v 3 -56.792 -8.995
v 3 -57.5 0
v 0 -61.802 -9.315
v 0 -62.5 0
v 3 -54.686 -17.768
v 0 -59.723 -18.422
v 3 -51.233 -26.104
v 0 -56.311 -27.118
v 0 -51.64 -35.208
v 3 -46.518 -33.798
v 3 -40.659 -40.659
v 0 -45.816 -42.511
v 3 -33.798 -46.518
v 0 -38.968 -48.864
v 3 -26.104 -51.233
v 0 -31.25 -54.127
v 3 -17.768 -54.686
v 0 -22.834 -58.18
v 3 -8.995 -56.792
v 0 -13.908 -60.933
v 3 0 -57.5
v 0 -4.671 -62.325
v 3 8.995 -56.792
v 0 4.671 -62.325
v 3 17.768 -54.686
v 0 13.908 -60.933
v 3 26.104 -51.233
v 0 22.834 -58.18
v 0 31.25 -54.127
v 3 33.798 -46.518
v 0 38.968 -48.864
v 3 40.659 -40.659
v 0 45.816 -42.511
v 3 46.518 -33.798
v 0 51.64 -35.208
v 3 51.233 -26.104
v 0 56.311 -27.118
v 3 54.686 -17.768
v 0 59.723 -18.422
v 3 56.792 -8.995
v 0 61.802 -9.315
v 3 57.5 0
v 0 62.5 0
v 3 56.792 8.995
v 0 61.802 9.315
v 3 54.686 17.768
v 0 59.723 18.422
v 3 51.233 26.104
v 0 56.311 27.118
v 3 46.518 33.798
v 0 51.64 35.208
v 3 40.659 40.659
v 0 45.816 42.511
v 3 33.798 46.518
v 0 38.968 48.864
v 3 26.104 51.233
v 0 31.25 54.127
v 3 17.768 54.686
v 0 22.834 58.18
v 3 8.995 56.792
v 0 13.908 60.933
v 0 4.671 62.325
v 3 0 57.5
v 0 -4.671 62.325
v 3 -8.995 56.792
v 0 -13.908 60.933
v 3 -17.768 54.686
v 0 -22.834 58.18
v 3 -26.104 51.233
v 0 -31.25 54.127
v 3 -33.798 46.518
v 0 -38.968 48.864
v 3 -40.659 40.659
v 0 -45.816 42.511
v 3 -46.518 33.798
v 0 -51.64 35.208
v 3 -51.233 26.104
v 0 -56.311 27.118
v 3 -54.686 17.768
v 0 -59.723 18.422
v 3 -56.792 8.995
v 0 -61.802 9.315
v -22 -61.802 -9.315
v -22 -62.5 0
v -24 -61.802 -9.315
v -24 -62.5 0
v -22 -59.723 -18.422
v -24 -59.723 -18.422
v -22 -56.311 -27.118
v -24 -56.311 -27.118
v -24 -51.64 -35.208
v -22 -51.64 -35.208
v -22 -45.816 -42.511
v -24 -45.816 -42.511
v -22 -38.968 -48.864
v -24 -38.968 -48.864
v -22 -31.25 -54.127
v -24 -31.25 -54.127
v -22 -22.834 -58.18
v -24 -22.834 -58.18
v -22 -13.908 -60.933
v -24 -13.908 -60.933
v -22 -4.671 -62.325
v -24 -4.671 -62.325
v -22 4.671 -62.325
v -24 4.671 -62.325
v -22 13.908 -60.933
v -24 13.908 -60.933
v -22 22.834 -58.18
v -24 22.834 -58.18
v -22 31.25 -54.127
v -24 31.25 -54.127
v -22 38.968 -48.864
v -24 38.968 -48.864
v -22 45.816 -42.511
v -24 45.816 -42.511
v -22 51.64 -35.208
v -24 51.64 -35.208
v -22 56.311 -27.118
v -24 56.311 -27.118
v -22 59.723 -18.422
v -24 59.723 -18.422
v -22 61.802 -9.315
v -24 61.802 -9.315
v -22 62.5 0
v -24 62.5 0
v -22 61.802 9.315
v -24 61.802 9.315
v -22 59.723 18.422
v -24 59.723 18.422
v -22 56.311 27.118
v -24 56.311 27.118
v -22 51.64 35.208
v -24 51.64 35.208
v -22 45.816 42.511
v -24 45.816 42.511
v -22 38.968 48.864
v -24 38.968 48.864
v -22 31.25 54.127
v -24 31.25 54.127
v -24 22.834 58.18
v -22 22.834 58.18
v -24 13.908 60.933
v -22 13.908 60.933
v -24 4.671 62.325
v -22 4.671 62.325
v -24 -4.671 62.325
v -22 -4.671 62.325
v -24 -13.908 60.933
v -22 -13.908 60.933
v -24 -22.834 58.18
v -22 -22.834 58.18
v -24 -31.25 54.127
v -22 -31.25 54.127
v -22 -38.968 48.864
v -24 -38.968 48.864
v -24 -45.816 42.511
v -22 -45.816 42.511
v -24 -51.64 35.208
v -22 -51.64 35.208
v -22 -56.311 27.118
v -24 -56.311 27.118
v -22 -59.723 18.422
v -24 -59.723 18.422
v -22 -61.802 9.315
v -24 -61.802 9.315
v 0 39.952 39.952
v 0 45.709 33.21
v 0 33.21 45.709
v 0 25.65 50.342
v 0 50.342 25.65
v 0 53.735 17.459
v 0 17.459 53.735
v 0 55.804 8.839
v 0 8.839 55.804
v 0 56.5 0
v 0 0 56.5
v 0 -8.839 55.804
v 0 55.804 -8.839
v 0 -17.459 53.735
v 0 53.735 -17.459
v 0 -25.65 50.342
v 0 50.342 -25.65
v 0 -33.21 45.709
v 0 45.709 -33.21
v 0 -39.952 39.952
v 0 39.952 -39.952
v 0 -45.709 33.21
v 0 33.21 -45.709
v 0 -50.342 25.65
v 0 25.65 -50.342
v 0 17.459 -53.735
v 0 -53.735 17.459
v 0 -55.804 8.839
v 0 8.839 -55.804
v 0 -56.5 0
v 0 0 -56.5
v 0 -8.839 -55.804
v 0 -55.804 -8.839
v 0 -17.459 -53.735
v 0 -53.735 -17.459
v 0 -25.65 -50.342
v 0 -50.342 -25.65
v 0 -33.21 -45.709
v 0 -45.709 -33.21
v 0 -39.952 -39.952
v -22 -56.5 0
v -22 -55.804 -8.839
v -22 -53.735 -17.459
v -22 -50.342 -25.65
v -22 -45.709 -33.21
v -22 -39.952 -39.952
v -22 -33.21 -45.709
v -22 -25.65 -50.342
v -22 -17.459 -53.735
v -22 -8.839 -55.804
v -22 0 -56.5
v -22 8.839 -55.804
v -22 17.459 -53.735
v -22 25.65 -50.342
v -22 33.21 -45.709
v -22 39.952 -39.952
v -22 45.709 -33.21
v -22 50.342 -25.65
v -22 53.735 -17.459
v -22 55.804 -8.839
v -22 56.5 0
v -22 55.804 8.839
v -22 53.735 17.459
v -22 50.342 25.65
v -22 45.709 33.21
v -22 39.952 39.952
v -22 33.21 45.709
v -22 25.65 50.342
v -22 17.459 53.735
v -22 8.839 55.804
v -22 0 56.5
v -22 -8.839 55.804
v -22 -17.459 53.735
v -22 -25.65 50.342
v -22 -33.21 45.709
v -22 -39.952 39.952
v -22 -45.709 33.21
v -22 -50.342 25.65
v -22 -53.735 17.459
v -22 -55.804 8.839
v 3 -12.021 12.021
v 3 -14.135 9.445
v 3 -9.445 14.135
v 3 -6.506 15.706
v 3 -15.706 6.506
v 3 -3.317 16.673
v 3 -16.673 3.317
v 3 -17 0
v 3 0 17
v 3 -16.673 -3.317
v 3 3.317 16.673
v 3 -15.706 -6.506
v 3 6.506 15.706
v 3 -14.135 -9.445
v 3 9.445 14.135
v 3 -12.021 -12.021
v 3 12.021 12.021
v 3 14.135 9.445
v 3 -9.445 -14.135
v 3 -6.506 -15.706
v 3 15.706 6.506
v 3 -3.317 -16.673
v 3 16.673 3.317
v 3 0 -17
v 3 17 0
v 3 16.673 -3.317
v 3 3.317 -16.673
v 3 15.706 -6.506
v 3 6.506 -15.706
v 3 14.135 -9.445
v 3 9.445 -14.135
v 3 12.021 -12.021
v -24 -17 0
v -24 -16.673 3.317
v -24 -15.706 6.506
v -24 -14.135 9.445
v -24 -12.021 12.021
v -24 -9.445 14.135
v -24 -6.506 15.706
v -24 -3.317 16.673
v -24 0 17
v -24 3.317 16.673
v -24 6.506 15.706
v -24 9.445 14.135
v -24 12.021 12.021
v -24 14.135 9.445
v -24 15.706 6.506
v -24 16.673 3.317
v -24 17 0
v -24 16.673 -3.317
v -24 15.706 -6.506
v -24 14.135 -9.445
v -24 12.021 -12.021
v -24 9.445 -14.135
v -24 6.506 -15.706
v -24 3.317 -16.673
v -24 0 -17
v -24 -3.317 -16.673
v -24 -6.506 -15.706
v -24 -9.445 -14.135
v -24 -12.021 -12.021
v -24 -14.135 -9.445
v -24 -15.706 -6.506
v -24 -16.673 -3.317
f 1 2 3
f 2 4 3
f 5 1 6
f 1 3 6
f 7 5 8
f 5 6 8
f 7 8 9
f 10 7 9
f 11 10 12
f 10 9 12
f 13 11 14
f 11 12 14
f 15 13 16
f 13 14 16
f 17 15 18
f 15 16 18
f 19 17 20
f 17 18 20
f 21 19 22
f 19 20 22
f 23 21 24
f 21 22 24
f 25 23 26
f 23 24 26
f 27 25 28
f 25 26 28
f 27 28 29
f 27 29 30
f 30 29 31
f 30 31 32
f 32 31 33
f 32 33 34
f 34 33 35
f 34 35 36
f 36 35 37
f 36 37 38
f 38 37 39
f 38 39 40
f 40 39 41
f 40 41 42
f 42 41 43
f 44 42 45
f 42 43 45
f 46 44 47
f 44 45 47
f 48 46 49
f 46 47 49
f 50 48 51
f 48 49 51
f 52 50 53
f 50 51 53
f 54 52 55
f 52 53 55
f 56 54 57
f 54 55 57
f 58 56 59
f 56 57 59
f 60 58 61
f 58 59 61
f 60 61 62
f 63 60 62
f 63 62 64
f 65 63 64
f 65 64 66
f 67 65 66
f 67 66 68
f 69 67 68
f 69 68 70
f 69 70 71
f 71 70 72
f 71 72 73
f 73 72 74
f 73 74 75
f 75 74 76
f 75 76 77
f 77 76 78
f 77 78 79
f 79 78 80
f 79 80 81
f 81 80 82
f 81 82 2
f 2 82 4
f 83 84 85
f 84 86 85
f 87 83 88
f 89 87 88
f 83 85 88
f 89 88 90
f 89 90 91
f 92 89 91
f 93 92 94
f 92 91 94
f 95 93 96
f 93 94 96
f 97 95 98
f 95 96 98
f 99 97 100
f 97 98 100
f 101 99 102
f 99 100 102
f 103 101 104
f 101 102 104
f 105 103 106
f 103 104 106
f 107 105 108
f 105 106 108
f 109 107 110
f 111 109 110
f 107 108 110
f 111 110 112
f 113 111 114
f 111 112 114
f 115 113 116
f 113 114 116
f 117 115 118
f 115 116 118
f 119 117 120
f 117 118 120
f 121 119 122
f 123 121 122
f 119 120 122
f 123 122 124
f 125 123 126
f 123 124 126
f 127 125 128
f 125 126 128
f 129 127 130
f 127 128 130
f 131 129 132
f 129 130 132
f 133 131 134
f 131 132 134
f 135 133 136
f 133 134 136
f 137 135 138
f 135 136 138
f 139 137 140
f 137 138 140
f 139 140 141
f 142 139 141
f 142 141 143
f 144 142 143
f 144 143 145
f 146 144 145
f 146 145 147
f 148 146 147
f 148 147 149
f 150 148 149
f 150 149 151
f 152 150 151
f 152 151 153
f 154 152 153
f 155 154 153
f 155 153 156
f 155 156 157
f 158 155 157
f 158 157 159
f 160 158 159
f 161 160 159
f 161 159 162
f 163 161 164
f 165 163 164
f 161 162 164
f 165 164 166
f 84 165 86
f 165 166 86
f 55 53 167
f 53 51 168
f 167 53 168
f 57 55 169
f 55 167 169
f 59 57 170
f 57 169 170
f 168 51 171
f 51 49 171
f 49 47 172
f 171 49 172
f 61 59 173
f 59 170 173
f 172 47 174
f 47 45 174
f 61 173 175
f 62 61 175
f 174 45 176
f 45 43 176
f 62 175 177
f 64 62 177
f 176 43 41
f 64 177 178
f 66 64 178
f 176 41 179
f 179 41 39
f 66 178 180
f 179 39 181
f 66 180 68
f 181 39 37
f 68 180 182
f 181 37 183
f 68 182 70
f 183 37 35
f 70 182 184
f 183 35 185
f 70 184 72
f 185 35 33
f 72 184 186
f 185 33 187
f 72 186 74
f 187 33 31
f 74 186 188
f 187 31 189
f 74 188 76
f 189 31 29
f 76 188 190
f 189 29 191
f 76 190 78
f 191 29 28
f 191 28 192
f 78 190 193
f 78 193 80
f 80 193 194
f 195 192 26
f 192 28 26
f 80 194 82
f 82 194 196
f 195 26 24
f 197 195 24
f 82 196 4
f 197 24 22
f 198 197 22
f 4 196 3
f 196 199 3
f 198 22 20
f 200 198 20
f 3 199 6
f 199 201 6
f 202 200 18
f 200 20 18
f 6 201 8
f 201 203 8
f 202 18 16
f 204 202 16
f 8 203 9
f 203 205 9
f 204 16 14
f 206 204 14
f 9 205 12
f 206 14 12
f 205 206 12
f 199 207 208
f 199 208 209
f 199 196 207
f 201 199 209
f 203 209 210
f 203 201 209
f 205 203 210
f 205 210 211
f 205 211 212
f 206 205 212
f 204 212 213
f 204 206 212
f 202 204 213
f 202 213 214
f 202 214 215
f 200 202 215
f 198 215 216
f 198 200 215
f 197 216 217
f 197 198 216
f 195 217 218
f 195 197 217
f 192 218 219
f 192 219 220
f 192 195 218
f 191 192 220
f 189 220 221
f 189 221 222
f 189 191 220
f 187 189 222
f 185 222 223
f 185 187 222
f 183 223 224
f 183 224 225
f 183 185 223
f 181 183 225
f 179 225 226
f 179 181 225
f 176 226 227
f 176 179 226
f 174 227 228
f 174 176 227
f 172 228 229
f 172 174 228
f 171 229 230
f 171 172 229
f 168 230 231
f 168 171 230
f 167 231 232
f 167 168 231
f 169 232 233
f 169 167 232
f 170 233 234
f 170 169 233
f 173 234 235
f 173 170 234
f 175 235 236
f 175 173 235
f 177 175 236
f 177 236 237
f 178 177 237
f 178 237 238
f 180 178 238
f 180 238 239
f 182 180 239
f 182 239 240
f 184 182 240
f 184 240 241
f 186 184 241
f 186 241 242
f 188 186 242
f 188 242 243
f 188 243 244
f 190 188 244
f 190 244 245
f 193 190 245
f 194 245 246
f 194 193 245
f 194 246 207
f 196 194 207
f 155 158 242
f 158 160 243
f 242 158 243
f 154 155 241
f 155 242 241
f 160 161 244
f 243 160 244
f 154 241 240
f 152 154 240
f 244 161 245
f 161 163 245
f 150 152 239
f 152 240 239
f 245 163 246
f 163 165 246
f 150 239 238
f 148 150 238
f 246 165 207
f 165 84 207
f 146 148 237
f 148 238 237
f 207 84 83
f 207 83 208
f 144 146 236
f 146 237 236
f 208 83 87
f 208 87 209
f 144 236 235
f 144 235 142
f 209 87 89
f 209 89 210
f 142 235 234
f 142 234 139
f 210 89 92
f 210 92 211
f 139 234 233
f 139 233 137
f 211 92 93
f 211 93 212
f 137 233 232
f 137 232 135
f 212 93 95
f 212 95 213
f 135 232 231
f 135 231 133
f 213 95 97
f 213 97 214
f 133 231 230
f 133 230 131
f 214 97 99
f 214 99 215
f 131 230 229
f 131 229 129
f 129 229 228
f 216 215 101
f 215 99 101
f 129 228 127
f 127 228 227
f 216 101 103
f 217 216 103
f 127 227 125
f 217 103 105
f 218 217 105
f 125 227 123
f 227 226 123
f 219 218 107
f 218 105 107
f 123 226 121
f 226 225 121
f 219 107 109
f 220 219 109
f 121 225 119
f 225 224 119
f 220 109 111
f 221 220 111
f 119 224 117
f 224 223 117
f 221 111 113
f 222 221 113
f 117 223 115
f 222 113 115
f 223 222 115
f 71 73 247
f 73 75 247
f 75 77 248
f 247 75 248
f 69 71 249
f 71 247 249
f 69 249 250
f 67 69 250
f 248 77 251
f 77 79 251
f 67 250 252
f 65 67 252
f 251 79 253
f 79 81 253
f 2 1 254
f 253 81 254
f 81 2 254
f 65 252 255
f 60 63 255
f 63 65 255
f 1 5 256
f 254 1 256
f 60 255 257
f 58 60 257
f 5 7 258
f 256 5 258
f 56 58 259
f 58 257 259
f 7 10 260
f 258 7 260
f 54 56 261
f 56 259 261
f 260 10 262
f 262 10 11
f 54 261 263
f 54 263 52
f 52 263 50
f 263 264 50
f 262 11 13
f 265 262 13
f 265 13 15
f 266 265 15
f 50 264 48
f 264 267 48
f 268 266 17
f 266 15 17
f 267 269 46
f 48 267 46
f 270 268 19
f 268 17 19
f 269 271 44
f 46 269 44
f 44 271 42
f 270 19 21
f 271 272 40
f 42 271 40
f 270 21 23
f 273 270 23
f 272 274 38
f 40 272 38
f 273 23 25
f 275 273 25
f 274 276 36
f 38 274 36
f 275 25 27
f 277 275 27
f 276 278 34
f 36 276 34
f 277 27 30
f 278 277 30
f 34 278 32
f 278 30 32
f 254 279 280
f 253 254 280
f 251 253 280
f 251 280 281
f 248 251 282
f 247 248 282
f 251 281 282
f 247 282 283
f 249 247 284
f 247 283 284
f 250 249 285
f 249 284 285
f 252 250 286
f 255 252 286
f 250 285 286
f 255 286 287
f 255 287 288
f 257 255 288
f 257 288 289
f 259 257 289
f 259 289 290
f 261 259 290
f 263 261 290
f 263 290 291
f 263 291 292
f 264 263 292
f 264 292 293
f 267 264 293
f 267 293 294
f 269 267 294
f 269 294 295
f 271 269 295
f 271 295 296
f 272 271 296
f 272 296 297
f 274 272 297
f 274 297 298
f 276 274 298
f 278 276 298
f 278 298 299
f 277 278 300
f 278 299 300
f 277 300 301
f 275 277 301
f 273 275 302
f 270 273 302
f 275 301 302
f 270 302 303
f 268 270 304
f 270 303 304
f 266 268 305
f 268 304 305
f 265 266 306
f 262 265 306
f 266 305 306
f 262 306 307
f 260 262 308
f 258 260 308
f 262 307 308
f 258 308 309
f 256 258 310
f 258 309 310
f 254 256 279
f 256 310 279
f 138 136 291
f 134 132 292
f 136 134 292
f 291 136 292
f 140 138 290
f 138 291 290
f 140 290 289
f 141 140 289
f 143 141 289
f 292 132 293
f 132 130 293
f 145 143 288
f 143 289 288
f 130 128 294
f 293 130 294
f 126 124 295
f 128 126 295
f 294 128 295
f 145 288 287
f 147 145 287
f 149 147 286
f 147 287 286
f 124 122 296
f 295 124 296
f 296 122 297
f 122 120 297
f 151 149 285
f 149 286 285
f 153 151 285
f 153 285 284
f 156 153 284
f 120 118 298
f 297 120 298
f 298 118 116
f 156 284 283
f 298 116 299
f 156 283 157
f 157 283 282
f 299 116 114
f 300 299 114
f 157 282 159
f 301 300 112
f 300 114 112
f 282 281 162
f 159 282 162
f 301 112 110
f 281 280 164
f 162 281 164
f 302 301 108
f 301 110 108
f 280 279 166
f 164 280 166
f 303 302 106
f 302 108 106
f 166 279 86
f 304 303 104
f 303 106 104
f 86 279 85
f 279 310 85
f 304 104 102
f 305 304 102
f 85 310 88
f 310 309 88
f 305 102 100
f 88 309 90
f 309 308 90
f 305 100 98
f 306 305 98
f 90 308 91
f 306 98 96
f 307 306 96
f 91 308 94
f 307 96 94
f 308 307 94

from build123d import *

# Parameters (mm, degrees)
ESQUISSE1_W             = 22
ESQUISSE1_H             = 56.5
ESQUISSE2_R             = 17
ENL_V_MAT_EXTRU_1_DEPTH = 93.420235879


with BuildPart() as part:
    # Esquisse1 → Révolution1 (revolve)
    with BuildSketch(Plane.XY, mode=Mode.PRIVATE) as r_volution1_sk:
        with Locations((-11, 28.25)):
            Rectangle(ESQUISSE1_W, ESQUISSE1_H)
        Polygon((0, 56.5), (0, 0), (3, 0), (3, 57.5), (0, 62.5), align=None)
        Polygon((-24, 0), (-22, 0), (-22, 56.5), (-22, 62.5), (-24, 62.5), align=None)
    revolve(r_volution1_sk.sketch.rotate(Axis((-24, 0, 0), (1, 0, 0)), 180), axis=Axis((-24, 0, 0), (1, 0, 0)))

    # Esquisse2 → Enlèv. mat.-Extru.1 (cut, through all)
    with BuildSketch(Plane.ZY.offset(24)):
        with Locations(Location((0, 0, 0), (0, 0, 270))):
            Circle(ESQUISSE2_R)
    extrude(amount=-ENL_V_MAT_EXTRU_1_DEPTH, mode=Mode.SUBTRACT)


solid = part.part
